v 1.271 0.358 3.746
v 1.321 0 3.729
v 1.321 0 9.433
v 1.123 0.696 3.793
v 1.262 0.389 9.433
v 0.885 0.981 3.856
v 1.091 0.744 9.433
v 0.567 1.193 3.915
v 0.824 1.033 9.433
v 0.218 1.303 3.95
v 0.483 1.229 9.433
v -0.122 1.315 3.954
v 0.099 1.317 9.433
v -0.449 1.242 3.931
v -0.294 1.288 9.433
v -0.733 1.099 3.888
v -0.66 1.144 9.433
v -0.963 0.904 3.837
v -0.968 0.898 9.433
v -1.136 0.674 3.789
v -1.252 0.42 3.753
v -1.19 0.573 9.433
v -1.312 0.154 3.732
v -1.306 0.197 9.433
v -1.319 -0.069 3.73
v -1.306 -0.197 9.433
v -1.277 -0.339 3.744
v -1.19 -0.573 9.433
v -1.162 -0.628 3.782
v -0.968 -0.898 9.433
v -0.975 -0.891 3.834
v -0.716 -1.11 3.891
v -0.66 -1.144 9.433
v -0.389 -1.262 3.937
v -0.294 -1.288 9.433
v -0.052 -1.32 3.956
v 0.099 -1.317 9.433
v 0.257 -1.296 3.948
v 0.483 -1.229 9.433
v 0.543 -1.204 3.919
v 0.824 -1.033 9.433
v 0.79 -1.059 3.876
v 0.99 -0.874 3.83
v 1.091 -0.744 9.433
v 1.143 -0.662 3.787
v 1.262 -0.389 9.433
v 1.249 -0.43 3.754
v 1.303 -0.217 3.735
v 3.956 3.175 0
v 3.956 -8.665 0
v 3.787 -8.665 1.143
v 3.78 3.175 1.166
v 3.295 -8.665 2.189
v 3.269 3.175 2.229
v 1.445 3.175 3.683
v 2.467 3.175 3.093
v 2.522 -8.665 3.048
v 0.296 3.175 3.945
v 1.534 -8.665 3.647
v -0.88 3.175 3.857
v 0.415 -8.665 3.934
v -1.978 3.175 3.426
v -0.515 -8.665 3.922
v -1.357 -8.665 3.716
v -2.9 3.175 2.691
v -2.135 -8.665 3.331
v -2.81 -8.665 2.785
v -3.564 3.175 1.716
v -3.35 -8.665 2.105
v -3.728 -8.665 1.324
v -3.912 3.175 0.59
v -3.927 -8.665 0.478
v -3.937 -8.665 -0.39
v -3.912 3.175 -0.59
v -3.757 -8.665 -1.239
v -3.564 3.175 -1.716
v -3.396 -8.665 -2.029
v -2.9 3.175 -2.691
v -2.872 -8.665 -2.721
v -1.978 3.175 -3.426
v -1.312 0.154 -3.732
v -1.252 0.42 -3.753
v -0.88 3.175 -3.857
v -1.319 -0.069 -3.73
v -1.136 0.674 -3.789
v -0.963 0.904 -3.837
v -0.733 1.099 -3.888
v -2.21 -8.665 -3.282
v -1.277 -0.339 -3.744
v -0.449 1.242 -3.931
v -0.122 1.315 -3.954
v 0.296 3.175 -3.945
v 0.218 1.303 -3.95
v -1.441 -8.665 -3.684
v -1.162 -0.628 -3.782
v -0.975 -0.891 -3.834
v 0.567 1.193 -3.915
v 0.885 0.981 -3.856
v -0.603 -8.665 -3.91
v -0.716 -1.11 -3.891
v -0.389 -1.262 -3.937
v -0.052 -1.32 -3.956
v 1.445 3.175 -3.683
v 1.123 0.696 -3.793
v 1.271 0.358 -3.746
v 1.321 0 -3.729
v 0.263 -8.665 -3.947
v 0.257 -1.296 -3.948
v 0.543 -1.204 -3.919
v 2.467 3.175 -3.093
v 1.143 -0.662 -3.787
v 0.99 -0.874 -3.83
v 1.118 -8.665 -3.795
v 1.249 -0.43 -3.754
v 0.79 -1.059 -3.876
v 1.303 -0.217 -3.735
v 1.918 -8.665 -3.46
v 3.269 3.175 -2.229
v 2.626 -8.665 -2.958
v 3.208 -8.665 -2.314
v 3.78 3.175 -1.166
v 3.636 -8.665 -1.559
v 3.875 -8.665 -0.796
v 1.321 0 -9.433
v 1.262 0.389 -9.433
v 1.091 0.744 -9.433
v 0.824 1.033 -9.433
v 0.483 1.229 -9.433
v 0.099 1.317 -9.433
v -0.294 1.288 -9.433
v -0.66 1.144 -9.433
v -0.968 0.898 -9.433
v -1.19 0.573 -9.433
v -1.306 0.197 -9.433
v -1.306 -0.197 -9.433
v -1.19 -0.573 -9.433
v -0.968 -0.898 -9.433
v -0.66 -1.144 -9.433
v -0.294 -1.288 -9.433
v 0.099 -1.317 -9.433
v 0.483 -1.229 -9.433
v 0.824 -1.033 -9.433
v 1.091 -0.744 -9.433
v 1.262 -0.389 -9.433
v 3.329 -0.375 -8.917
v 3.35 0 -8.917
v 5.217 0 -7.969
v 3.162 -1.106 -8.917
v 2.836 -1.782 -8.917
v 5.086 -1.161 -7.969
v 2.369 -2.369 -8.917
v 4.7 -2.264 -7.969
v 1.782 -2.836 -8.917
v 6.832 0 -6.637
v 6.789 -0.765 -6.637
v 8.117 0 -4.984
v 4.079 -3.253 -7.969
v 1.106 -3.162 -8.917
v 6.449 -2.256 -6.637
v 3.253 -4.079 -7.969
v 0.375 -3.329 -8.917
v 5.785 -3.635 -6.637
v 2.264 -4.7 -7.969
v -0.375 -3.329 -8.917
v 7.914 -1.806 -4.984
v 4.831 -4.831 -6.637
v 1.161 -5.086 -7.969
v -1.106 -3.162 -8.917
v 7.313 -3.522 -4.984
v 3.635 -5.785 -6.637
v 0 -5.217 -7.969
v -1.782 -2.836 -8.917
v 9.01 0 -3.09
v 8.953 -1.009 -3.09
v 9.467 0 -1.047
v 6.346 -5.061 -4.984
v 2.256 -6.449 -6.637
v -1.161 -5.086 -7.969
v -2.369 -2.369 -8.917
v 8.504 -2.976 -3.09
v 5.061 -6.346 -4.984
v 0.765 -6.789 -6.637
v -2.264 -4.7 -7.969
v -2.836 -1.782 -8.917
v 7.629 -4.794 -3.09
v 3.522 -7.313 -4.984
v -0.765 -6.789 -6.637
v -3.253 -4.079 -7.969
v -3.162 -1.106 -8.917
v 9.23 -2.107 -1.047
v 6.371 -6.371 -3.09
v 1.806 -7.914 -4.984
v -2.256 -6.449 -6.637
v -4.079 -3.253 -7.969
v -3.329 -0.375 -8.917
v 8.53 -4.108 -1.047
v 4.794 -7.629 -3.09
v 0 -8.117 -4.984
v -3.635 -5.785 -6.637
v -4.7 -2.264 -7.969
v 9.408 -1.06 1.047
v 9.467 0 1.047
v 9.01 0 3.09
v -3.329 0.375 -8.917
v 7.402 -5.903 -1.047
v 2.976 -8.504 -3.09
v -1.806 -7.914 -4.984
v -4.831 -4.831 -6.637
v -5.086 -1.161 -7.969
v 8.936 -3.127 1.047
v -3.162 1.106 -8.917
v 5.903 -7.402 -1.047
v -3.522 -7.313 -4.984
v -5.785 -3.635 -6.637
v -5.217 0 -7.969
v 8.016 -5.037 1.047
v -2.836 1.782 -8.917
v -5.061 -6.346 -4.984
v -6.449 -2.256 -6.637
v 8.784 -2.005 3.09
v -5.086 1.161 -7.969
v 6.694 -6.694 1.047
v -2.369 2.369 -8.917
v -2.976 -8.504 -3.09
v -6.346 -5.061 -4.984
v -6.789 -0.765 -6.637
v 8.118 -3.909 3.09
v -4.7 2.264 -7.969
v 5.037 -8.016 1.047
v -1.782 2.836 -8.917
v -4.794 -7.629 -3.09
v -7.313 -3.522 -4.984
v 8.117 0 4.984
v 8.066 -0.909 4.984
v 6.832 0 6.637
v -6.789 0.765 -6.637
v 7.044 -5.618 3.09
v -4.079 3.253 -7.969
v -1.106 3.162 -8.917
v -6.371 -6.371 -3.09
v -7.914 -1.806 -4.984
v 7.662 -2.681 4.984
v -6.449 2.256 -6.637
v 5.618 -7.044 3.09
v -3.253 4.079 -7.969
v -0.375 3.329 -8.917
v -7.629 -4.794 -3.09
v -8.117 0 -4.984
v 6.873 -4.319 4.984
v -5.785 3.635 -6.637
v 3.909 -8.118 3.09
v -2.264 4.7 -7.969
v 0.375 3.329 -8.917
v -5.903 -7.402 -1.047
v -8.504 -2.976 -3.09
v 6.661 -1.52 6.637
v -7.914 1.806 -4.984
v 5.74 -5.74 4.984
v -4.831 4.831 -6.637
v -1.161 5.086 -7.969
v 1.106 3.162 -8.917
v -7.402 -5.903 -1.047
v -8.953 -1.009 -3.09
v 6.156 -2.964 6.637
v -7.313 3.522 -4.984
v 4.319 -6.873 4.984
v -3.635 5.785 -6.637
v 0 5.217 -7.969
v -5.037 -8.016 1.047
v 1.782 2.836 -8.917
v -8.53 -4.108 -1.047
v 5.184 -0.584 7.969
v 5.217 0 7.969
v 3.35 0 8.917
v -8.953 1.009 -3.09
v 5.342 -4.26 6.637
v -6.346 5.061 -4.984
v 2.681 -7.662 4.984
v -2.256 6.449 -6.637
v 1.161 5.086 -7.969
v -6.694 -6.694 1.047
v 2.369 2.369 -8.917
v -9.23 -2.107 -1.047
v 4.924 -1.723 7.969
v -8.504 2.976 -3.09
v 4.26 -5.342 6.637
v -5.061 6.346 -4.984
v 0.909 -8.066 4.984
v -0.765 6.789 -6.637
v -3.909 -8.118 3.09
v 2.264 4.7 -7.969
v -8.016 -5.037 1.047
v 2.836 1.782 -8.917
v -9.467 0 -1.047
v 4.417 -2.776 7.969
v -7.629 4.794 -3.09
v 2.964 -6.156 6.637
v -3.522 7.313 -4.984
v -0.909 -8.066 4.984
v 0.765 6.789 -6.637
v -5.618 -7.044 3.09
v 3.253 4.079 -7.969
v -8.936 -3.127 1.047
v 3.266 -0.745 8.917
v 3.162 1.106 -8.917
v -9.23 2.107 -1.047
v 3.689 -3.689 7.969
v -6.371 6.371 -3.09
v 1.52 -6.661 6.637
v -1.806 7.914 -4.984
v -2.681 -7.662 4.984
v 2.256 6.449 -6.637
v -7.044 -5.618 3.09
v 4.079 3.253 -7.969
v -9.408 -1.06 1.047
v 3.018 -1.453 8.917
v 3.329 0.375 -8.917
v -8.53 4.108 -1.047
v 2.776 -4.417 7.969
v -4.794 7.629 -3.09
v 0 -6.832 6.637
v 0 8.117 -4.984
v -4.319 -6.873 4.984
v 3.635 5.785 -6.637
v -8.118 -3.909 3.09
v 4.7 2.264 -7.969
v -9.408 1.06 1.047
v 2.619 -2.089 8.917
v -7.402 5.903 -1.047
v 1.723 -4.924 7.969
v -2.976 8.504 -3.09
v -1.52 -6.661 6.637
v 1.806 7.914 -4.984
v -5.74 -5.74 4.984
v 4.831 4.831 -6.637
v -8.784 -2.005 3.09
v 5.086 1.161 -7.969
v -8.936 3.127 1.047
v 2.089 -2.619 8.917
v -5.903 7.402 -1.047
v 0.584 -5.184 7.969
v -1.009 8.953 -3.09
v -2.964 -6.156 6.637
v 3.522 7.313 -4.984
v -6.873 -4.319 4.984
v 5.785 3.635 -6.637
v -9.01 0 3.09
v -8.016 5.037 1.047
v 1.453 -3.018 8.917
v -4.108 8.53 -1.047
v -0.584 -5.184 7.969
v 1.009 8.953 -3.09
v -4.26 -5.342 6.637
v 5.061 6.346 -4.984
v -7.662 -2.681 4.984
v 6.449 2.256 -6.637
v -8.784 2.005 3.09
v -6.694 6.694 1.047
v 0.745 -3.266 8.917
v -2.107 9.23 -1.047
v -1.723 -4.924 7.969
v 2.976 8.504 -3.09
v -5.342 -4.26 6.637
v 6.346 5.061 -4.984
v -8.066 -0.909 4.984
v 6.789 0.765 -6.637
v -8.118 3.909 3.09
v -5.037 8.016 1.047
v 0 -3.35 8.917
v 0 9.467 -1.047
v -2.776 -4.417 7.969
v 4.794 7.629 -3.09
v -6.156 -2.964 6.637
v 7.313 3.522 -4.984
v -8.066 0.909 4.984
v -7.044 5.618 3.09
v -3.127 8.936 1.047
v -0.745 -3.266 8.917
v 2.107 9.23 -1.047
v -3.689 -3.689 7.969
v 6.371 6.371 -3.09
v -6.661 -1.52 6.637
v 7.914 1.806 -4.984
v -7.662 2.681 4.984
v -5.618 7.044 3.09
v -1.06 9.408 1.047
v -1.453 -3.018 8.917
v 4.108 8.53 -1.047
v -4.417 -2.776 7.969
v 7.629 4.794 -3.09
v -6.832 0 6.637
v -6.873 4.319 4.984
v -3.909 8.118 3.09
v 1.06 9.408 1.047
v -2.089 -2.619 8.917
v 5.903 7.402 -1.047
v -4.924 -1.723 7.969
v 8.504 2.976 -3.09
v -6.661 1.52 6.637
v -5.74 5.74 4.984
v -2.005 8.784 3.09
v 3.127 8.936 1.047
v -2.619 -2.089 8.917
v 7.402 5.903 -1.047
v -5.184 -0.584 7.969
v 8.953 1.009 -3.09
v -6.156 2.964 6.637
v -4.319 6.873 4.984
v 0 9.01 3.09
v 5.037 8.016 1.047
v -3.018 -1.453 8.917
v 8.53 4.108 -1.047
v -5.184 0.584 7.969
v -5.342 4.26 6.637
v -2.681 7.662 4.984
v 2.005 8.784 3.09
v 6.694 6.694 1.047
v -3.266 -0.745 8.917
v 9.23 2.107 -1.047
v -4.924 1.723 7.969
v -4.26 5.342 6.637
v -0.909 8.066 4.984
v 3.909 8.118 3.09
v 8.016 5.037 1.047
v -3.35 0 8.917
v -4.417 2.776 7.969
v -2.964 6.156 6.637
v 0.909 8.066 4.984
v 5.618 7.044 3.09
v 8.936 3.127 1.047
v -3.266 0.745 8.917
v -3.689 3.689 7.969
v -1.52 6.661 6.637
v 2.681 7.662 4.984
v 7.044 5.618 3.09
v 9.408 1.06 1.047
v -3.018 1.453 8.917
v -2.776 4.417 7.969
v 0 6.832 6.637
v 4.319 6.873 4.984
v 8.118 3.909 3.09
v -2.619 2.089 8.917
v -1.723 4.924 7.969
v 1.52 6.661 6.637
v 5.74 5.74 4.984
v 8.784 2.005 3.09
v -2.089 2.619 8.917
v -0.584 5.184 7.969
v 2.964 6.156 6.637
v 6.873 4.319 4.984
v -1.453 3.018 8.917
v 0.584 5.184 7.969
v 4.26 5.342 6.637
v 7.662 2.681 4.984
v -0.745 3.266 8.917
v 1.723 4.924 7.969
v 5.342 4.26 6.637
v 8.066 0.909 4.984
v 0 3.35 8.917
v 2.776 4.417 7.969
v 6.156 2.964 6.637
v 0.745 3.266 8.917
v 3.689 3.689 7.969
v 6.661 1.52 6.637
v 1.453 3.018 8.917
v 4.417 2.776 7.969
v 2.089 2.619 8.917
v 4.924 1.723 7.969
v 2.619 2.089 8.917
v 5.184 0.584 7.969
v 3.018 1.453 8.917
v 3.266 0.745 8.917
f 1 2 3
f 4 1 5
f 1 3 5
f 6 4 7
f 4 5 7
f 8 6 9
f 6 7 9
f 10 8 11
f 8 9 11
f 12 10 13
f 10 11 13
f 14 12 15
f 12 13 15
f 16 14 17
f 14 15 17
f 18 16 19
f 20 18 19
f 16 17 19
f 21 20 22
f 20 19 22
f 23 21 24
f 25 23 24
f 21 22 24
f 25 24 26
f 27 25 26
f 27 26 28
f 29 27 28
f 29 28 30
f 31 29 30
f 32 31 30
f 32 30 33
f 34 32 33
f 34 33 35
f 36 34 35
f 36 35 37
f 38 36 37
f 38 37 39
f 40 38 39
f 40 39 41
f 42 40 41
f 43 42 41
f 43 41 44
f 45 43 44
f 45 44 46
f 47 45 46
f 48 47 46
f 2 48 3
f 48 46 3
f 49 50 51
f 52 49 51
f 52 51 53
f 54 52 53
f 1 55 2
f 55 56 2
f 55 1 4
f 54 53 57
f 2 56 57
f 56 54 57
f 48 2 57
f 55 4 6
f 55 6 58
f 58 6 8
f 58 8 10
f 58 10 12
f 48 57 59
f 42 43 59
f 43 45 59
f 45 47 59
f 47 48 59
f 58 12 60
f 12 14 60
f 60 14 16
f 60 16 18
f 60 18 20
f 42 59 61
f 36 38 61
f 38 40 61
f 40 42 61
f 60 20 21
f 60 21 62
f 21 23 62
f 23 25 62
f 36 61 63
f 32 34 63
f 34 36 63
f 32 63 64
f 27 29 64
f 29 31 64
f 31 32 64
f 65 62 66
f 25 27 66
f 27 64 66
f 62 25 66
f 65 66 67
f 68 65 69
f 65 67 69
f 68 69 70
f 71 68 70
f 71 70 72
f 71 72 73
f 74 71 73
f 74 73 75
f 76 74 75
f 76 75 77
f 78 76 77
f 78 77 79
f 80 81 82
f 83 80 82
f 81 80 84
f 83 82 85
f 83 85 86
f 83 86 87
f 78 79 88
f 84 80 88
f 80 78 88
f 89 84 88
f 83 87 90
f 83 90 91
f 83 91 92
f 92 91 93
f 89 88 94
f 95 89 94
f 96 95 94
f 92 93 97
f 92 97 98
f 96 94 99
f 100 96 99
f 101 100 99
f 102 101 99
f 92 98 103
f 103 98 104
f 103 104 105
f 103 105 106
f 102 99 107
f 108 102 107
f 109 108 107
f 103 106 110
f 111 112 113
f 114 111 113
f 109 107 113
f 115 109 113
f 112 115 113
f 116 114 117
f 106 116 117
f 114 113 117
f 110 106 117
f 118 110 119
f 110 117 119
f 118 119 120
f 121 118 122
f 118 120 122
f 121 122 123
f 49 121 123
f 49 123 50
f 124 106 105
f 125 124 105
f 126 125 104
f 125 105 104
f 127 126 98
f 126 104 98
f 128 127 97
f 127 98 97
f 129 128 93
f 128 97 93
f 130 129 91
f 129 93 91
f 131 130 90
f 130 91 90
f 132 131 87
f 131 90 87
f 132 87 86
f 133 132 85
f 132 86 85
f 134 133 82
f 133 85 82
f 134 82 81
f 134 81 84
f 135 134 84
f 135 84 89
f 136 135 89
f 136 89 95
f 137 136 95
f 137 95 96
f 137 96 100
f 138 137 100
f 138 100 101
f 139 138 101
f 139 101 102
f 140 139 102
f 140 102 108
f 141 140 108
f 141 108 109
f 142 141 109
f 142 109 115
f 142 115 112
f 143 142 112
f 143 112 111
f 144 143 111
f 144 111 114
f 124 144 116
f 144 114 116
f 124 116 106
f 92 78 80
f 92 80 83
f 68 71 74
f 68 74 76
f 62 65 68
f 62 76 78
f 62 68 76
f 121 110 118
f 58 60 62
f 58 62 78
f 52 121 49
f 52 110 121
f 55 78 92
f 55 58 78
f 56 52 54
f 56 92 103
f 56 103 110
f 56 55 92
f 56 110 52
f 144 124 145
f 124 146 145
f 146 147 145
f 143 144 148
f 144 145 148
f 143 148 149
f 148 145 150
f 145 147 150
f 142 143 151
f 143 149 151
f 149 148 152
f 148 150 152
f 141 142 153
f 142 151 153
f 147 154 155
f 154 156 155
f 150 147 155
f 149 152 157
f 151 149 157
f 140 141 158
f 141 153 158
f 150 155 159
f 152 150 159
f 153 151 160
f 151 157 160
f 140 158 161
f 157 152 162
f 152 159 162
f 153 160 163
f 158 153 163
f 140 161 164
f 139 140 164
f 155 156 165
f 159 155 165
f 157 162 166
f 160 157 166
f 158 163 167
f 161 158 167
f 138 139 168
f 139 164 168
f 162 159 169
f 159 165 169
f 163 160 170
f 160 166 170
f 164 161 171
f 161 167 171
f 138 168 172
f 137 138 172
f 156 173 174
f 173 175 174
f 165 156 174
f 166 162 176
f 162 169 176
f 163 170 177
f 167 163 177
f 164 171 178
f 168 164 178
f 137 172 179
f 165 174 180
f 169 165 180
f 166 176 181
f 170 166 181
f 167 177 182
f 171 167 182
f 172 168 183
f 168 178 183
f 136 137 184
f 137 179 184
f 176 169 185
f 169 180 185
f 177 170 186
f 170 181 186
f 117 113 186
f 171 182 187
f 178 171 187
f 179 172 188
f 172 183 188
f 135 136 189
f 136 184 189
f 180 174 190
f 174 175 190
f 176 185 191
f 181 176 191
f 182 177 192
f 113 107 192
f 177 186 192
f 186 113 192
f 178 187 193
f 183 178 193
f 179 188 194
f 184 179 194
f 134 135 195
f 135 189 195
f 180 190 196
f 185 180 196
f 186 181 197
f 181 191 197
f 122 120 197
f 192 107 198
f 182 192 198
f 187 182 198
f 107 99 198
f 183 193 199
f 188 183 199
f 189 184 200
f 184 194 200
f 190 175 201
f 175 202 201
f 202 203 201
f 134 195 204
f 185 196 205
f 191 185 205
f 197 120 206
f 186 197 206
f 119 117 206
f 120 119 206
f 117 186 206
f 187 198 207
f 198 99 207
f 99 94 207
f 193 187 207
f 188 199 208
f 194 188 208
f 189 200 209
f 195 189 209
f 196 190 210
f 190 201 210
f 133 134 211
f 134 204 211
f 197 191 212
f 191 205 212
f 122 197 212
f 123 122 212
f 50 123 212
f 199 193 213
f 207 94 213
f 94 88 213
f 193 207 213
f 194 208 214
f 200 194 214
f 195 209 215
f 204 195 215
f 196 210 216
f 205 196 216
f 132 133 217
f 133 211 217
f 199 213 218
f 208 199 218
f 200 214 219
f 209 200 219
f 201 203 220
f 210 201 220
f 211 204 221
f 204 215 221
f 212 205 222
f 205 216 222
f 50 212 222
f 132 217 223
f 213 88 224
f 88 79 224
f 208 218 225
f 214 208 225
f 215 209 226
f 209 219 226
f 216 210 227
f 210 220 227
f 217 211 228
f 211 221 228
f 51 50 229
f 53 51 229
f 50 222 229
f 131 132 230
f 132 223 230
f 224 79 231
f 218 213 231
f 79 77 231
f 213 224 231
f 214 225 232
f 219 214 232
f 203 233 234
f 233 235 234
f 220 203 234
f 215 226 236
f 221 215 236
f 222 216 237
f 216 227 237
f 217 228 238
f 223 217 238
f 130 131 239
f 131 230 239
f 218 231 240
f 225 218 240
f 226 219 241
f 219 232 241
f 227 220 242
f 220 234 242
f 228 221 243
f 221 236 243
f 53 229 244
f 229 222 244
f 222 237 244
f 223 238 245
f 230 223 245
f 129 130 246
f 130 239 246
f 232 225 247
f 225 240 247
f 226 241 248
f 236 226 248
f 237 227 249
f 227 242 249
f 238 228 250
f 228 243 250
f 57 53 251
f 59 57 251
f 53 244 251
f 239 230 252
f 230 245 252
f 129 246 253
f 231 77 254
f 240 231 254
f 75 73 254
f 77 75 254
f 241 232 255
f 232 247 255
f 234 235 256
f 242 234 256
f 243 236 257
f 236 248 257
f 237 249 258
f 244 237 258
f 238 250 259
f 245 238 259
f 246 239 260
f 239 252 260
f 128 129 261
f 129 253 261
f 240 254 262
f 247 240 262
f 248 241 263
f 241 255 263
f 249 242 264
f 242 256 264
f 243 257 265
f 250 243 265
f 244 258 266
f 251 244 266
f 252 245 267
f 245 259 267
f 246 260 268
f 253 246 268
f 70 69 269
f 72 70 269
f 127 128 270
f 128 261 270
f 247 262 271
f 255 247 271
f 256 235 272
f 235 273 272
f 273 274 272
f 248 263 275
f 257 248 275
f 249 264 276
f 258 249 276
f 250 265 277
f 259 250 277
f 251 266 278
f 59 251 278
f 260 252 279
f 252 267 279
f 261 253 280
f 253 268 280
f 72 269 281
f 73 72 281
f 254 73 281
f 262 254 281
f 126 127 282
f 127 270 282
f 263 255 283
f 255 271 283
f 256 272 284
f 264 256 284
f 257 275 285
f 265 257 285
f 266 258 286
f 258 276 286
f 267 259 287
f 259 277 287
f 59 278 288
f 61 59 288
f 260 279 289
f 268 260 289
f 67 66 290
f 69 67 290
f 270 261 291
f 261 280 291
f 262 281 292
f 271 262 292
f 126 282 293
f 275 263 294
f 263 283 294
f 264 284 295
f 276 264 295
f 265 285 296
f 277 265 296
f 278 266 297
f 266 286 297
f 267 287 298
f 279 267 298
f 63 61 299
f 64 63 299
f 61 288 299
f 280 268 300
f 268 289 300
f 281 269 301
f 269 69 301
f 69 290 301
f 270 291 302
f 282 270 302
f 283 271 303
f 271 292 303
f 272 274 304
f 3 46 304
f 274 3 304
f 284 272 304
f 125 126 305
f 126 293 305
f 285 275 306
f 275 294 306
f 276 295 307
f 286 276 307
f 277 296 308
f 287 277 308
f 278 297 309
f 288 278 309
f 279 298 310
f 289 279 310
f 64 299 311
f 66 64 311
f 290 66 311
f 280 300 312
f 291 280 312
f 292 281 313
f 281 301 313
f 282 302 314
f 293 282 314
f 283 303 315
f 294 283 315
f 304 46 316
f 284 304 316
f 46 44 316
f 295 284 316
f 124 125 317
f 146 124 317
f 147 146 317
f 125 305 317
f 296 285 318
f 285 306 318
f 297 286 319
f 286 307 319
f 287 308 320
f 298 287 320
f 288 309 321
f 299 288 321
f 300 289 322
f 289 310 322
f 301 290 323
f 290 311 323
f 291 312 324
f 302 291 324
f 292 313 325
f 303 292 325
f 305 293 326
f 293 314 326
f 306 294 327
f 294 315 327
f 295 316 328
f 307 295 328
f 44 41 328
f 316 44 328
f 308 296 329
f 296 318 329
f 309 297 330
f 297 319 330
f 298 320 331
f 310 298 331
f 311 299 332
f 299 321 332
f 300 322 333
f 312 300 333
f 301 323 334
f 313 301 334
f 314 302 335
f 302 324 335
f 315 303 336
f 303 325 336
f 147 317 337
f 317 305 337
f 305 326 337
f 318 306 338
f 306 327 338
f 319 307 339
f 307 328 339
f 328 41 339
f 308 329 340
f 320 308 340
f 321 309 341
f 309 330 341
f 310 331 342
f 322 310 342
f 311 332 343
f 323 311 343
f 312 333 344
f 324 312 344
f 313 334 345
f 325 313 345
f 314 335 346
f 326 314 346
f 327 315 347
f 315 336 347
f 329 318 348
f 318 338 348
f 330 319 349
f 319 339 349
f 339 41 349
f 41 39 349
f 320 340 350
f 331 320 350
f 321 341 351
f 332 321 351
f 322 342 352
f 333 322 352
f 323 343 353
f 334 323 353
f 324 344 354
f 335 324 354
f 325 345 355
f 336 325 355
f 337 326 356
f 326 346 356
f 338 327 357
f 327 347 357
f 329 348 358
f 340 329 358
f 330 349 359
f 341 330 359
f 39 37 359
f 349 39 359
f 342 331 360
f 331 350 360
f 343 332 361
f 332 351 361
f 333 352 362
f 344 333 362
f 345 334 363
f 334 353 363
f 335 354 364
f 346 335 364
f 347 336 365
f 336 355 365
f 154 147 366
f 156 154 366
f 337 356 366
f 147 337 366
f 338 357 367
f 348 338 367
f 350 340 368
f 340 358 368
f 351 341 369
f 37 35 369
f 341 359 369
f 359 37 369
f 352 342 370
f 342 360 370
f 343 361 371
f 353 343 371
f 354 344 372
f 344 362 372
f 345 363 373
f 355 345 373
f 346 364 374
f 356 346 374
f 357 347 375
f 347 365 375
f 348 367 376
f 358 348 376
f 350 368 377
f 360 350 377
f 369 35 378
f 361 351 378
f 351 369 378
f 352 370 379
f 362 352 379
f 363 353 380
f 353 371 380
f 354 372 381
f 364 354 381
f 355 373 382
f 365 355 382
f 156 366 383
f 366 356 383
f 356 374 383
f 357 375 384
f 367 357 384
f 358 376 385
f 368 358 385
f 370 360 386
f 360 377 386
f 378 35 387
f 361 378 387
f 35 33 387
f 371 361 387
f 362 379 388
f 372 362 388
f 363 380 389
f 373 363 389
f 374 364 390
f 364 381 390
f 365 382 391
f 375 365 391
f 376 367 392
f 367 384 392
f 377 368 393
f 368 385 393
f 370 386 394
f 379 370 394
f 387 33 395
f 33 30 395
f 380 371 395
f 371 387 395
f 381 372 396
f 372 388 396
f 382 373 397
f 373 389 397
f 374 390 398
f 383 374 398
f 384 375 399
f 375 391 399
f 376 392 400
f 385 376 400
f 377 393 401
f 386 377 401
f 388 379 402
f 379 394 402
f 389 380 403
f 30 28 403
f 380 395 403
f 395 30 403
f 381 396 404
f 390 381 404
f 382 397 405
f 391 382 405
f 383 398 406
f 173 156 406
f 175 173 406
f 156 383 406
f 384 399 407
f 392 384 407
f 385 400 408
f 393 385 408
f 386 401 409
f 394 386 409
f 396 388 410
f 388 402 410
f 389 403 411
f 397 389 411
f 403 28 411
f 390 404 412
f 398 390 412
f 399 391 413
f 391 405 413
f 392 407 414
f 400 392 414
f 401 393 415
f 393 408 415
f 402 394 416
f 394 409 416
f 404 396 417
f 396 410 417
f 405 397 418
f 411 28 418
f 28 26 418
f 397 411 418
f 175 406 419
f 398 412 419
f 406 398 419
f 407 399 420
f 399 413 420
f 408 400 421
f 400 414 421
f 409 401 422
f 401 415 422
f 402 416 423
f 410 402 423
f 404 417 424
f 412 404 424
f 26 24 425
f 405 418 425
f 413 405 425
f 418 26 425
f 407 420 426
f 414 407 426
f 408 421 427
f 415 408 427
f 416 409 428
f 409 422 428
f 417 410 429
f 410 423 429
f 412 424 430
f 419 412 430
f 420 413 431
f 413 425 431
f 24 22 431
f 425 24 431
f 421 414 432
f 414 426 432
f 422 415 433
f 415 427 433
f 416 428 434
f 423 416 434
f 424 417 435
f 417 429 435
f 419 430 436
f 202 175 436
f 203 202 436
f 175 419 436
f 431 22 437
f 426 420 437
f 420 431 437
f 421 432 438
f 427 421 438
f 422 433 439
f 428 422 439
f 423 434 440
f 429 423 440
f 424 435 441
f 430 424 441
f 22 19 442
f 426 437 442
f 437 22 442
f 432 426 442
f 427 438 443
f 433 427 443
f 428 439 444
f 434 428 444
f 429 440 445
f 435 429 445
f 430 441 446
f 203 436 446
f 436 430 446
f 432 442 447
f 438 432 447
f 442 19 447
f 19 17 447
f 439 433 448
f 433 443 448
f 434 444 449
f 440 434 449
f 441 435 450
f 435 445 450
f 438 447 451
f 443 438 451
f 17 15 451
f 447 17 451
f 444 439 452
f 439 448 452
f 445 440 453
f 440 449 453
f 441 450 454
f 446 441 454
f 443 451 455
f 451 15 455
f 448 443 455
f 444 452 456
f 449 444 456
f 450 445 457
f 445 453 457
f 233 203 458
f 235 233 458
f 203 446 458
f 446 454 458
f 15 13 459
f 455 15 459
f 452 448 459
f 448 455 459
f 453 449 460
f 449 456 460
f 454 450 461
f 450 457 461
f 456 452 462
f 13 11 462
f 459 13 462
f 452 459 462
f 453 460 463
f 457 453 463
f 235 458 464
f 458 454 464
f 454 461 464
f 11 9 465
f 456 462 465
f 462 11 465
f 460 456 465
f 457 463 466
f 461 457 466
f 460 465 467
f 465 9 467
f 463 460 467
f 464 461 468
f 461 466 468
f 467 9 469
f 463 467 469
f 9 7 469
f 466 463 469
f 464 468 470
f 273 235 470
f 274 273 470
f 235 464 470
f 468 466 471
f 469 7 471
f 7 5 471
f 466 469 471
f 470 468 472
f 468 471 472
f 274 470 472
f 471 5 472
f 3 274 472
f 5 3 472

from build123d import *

# Parameters (mm, degrees)
F3_R     = 3.95605
F4_DEPTH = 12.7
F6_R     = 1.3208
F7_DEPTH = 19.051


with BuildPart() as f1:
    # F0 (on Front) → F1 (revolve)
    with BuildSketch(Plane.XZ):
        with BuildLine():
            Line((0, 9.525), (0, -9.525))
            ThreePointArc((0, -9.525), (9.525, 0), (0, 9.525))
        make_face()
    revolve(axis=Axis((0, 0, 0), (0, 0, -1)))

    # F3 (on offset) → F4 (cut)
    with BuildSketch(Plane.XZ.offset(9.525)):
        Circle(F3_R)
    extrude(amount=-F4_DEPTH, mode=Mode.SUBTRACT)

    # F6 (on offset) → F7 (cut, through all)
    with BuildSketch(Plane.XY.offset(9.525)):
        Circle(F6_R)
    extrude(amount=-F7_DEPTH, mode=Mode.SUBTRACT)


solid = f1.part
